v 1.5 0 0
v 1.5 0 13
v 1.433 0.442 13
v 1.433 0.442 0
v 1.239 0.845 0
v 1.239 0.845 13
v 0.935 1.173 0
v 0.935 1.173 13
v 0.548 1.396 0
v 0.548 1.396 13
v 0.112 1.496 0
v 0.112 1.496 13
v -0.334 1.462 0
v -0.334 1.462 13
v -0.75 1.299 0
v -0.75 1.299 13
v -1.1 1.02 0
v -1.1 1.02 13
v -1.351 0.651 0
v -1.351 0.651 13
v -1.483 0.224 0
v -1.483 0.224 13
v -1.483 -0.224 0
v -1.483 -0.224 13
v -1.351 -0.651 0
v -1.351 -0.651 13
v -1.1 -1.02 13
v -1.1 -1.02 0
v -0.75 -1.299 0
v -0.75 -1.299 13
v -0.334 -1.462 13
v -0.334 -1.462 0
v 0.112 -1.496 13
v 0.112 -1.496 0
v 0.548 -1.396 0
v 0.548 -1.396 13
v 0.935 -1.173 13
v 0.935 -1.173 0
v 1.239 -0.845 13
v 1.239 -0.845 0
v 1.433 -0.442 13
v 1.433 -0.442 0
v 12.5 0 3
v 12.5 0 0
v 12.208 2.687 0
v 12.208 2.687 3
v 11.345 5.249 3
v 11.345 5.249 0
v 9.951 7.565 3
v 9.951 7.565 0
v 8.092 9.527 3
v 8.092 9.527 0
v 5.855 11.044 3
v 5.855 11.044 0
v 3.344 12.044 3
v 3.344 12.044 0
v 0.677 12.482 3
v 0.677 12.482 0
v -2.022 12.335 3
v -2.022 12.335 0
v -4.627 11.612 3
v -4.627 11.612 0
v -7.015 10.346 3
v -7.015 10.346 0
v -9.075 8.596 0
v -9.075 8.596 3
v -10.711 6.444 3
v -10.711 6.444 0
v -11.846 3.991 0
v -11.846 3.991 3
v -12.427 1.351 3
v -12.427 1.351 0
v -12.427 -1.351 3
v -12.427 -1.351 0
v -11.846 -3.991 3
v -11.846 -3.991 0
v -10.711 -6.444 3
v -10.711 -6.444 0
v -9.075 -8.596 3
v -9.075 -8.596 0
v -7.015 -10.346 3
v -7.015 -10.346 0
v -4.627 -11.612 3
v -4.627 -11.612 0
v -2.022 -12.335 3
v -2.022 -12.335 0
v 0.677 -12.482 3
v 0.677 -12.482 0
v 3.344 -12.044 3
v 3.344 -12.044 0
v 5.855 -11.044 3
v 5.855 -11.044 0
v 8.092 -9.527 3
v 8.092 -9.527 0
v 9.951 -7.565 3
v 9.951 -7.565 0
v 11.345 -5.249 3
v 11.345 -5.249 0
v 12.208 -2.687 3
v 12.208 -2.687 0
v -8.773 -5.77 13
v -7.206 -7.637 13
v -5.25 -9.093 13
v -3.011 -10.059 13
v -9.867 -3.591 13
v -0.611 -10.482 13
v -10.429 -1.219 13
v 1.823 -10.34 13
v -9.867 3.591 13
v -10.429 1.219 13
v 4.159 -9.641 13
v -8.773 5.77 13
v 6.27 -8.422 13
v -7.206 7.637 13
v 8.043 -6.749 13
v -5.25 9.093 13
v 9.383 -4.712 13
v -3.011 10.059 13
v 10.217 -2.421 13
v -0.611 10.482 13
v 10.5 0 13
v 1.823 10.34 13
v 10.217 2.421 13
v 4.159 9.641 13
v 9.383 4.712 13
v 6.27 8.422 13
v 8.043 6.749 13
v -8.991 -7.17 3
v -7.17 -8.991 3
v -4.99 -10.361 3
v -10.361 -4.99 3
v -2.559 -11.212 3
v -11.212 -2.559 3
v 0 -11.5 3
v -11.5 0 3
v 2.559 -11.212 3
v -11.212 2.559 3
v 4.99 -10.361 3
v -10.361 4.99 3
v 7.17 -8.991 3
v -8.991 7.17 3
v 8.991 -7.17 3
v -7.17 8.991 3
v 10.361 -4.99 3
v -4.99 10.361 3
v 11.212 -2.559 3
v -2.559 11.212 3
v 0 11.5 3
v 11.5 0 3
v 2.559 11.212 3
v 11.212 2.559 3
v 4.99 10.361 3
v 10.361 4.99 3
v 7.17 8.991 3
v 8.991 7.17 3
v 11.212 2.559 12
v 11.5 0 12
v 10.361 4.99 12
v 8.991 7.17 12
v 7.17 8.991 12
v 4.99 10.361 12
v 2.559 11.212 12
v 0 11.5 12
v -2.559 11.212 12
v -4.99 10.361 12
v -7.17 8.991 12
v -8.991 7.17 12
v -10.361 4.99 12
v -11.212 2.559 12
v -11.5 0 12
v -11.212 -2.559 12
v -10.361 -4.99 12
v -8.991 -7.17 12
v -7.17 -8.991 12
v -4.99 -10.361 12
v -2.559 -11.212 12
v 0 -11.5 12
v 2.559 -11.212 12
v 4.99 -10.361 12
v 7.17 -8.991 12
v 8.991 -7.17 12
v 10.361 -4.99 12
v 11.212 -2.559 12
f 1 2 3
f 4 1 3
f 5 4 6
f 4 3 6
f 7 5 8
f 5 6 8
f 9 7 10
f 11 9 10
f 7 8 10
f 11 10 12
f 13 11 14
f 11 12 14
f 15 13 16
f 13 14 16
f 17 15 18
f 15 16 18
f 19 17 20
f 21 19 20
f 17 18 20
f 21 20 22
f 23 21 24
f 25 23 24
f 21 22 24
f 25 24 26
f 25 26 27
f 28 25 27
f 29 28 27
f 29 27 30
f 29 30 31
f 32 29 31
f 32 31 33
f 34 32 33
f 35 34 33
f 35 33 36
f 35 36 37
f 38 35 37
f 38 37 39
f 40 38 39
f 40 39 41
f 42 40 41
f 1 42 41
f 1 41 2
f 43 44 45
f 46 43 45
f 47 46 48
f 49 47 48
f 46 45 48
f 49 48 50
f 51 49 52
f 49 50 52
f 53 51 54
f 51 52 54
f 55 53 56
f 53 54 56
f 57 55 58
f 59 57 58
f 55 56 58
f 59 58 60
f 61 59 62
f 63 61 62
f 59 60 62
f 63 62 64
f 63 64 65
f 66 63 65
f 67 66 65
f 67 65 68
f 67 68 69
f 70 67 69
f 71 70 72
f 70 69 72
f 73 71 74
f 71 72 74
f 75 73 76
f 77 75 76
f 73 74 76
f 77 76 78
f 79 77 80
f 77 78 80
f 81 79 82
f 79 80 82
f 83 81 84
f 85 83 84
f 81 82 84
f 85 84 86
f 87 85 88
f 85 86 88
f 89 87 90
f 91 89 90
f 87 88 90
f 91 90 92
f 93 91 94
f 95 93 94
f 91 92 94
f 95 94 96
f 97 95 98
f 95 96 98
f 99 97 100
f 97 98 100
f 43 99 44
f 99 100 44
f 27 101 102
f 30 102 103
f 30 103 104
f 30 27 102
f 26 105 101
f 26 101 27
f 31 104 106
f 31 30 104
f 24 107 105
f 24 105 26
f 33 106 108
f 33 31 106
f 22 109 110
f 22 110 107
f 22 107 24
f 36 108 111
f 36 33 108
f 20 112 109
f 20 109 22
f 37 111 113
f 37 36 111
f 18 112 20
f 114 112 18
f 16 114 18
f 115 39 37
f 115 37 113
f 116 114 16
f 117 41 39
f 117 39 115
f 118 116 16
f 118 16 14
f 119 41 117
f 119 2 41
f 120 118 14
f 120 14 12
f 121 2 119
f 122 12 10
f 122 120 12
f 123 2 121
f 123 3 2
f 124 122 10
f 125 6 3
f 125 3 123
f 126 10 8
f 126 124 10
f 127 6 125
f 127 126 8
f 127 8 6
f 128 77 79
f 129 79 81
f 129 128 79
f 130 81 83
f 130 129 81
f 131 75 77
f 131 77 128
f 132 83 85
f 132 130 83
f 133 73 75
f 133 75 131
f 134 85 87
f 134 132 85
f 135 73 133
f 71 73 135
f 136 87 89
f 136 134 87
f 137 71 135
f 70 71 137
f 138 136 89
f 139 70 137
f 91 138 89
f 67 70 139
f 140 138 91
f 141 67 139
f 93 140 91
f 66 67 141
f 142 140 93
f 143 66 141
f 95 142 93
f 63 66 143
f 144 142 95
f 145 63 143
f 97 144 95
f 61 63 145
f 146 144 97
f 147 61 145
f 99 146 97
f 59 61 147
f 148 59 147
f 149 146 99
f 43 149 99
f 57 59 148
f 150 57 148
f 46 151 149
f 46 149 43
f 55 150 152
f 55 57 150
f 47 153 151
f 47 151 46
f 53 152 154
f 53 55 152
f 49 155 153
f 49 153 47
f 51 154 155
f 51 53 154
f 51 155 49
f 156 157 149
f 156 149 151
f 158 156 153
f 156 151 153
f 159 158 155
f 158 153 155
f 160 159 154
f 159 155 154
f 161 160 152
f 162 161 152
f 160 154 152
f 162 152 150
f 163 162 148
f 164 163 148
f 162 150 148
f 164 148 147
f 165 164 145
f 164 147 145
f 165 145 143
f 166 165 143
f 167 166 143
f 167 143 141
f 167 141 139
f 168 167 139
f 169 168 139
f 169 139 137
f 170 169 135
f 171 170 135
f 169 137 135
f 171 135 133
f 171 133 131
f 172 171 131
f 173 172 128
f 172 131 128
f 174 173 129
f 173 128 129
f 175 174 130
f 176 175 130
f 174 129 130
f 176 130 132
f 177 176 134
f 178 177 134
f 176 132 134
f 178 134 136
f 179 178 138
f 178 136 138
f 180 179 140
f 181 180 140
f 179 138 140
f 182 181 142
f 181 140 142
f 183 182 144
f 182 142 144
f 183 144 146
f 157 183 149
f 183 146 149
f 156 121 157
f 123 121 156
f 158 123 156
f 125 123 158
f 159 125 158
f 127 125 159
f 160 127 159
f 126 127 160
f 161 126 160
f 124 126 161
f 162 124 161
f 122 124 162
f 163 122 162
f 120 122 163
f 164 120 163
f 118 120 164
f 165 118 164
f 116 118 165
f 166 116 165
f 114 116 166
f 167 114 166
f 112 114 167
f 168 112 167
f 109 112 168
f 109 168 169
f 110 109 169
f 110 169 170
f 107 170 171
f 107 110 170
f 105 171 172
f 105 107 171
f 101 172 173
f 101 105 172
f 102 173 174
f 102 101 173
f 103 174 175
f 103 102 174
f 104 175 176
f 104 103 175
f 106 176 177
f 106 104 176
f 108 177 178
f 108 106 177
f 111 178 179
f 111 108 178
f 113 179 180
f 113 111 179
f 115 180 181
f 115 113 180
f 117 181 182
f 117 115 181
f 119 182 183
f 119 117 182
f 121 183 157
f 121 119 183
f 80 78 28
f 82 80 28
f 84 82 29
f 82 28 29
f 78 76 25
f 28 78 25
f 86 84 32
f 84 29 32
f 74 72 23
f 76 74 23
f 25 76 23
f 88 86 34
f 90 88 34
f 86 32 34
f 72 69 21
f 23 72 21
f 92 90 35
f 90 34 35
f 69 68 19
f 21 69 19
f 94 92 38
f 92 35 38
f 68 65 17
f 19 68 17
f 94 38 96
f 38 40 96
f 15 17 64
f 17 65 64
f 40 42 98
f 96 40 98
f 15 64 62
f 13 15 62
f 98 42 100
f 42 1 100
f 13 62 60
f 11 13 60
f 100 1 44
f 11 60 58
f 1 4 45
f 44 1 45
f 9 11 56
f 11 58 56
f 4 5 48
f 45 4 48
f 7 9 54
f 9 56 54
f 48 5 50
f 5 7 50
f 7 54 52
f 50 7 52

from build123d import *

# Parameters (mm, degrees)
ESQUISSE1_R       = 12.5
EXTRUSION1_DEPTH  = 3
ESQUISSE2_R       = 11.5
EXTRUSION2_DEPTH  = 10
CHANFREIN1_SIZE   = 1
TROU_TARAUD_M41_D = 3


with BuildPart() as part:
    # Esquisse1 → Extrusion1 (new body)
    with BuildSketch(Plane.XY):
        Circle(ESQUISSE1_R)
    extrude(amount=EXTRUSION1_DEPTH)

    # Esquisse2 → Extrusion2 (add)
    with BuildSketch(Plane.XY.offset(3)):
        Circle(ESQUISSE2_R)
    extrude(amount=EXTRUSION2_DEPTH)

    # Chanfrein1
    chanfrein1_edges = [part.edges().sort_by_distance(p)[0] for p in [
        (-11.5, 0, 13),
    ]]
    chamfer(chanfrein1_edges, length=CHANFREIN1_SIZE)

    # Trou taraudé M41 (through all)
    with Locations(Plane(origin=(0, 0, 0), x_dir=(-1, 0, 0), z_dir=(0, 0, -1))):
        with Locations((0, 0)):
            Hole(TROU_TARAUD_M41_D / 2)


solid = part.part
